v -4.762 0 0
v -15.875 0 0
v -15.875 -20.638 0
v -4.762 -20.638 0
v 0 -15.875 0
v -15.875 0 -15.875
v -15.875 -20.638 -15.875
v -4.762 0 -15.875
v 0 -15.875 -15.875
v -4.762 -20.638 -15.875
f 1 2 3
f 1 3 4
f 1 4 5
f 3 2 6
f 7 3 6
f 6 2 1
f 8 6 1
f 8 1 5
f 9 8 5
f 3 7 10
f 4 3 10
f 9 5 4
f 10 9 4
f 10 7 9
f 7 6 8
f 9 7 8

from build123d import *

# Parameters (mm, degrees)
F0_W     = 15.875
F0_H     = 15.875
F1_DEPTH = 20.6375
F3_DEPTH = 15.876
F5_DEPTH = 15.876
F8_ANGLE = 90


with BuildPart() as f1:
    # F0 (on Top) → F1 (new body)
    with BuildSketch(Plane.XY):
        Rectangle(F0_W, F0_H)
    extrude(amount=-F1_DEPTH)

    # F2 (on face) → F3 (cut, through all)
    with BuildSketch(Plane.XZ.offset(7.9375)):
        Polygon((7.9375, 0), (3.175, 0), (7.9375, -15.875), align=None)
    extrude(amount=-F3_DEPTH, mode=Mode.SUBTRACT)

    # F4 (on face) → F5 (cut, through all)
    with BuildSketch(Plane.XZ.offset(7.9375)):
        Polygon((7.9375, -20.6375), (7.9375, -15.875), (3.175, -20.6375), align=None)
    extrude(amount=-F5_DEPTH, mode=Mode.SUBTRACT)


with BuildPart() as f1_1:
    # F6: moved
    add(f1.part.moved(Location((-7.9375, 0, 0))))


with BuildPart() as f1_2:
    # F7: moved
    add(f1_1.part.moved(Location((0, 7.9375, 0))))


with BuildPart() as f1_3:
    # F8: moved
    add(f1_2.part.rotate(Axis((-10.31875, 0, 0), (-1, 0, 0)), F8_ANGLE))


solid = f1_3.part
